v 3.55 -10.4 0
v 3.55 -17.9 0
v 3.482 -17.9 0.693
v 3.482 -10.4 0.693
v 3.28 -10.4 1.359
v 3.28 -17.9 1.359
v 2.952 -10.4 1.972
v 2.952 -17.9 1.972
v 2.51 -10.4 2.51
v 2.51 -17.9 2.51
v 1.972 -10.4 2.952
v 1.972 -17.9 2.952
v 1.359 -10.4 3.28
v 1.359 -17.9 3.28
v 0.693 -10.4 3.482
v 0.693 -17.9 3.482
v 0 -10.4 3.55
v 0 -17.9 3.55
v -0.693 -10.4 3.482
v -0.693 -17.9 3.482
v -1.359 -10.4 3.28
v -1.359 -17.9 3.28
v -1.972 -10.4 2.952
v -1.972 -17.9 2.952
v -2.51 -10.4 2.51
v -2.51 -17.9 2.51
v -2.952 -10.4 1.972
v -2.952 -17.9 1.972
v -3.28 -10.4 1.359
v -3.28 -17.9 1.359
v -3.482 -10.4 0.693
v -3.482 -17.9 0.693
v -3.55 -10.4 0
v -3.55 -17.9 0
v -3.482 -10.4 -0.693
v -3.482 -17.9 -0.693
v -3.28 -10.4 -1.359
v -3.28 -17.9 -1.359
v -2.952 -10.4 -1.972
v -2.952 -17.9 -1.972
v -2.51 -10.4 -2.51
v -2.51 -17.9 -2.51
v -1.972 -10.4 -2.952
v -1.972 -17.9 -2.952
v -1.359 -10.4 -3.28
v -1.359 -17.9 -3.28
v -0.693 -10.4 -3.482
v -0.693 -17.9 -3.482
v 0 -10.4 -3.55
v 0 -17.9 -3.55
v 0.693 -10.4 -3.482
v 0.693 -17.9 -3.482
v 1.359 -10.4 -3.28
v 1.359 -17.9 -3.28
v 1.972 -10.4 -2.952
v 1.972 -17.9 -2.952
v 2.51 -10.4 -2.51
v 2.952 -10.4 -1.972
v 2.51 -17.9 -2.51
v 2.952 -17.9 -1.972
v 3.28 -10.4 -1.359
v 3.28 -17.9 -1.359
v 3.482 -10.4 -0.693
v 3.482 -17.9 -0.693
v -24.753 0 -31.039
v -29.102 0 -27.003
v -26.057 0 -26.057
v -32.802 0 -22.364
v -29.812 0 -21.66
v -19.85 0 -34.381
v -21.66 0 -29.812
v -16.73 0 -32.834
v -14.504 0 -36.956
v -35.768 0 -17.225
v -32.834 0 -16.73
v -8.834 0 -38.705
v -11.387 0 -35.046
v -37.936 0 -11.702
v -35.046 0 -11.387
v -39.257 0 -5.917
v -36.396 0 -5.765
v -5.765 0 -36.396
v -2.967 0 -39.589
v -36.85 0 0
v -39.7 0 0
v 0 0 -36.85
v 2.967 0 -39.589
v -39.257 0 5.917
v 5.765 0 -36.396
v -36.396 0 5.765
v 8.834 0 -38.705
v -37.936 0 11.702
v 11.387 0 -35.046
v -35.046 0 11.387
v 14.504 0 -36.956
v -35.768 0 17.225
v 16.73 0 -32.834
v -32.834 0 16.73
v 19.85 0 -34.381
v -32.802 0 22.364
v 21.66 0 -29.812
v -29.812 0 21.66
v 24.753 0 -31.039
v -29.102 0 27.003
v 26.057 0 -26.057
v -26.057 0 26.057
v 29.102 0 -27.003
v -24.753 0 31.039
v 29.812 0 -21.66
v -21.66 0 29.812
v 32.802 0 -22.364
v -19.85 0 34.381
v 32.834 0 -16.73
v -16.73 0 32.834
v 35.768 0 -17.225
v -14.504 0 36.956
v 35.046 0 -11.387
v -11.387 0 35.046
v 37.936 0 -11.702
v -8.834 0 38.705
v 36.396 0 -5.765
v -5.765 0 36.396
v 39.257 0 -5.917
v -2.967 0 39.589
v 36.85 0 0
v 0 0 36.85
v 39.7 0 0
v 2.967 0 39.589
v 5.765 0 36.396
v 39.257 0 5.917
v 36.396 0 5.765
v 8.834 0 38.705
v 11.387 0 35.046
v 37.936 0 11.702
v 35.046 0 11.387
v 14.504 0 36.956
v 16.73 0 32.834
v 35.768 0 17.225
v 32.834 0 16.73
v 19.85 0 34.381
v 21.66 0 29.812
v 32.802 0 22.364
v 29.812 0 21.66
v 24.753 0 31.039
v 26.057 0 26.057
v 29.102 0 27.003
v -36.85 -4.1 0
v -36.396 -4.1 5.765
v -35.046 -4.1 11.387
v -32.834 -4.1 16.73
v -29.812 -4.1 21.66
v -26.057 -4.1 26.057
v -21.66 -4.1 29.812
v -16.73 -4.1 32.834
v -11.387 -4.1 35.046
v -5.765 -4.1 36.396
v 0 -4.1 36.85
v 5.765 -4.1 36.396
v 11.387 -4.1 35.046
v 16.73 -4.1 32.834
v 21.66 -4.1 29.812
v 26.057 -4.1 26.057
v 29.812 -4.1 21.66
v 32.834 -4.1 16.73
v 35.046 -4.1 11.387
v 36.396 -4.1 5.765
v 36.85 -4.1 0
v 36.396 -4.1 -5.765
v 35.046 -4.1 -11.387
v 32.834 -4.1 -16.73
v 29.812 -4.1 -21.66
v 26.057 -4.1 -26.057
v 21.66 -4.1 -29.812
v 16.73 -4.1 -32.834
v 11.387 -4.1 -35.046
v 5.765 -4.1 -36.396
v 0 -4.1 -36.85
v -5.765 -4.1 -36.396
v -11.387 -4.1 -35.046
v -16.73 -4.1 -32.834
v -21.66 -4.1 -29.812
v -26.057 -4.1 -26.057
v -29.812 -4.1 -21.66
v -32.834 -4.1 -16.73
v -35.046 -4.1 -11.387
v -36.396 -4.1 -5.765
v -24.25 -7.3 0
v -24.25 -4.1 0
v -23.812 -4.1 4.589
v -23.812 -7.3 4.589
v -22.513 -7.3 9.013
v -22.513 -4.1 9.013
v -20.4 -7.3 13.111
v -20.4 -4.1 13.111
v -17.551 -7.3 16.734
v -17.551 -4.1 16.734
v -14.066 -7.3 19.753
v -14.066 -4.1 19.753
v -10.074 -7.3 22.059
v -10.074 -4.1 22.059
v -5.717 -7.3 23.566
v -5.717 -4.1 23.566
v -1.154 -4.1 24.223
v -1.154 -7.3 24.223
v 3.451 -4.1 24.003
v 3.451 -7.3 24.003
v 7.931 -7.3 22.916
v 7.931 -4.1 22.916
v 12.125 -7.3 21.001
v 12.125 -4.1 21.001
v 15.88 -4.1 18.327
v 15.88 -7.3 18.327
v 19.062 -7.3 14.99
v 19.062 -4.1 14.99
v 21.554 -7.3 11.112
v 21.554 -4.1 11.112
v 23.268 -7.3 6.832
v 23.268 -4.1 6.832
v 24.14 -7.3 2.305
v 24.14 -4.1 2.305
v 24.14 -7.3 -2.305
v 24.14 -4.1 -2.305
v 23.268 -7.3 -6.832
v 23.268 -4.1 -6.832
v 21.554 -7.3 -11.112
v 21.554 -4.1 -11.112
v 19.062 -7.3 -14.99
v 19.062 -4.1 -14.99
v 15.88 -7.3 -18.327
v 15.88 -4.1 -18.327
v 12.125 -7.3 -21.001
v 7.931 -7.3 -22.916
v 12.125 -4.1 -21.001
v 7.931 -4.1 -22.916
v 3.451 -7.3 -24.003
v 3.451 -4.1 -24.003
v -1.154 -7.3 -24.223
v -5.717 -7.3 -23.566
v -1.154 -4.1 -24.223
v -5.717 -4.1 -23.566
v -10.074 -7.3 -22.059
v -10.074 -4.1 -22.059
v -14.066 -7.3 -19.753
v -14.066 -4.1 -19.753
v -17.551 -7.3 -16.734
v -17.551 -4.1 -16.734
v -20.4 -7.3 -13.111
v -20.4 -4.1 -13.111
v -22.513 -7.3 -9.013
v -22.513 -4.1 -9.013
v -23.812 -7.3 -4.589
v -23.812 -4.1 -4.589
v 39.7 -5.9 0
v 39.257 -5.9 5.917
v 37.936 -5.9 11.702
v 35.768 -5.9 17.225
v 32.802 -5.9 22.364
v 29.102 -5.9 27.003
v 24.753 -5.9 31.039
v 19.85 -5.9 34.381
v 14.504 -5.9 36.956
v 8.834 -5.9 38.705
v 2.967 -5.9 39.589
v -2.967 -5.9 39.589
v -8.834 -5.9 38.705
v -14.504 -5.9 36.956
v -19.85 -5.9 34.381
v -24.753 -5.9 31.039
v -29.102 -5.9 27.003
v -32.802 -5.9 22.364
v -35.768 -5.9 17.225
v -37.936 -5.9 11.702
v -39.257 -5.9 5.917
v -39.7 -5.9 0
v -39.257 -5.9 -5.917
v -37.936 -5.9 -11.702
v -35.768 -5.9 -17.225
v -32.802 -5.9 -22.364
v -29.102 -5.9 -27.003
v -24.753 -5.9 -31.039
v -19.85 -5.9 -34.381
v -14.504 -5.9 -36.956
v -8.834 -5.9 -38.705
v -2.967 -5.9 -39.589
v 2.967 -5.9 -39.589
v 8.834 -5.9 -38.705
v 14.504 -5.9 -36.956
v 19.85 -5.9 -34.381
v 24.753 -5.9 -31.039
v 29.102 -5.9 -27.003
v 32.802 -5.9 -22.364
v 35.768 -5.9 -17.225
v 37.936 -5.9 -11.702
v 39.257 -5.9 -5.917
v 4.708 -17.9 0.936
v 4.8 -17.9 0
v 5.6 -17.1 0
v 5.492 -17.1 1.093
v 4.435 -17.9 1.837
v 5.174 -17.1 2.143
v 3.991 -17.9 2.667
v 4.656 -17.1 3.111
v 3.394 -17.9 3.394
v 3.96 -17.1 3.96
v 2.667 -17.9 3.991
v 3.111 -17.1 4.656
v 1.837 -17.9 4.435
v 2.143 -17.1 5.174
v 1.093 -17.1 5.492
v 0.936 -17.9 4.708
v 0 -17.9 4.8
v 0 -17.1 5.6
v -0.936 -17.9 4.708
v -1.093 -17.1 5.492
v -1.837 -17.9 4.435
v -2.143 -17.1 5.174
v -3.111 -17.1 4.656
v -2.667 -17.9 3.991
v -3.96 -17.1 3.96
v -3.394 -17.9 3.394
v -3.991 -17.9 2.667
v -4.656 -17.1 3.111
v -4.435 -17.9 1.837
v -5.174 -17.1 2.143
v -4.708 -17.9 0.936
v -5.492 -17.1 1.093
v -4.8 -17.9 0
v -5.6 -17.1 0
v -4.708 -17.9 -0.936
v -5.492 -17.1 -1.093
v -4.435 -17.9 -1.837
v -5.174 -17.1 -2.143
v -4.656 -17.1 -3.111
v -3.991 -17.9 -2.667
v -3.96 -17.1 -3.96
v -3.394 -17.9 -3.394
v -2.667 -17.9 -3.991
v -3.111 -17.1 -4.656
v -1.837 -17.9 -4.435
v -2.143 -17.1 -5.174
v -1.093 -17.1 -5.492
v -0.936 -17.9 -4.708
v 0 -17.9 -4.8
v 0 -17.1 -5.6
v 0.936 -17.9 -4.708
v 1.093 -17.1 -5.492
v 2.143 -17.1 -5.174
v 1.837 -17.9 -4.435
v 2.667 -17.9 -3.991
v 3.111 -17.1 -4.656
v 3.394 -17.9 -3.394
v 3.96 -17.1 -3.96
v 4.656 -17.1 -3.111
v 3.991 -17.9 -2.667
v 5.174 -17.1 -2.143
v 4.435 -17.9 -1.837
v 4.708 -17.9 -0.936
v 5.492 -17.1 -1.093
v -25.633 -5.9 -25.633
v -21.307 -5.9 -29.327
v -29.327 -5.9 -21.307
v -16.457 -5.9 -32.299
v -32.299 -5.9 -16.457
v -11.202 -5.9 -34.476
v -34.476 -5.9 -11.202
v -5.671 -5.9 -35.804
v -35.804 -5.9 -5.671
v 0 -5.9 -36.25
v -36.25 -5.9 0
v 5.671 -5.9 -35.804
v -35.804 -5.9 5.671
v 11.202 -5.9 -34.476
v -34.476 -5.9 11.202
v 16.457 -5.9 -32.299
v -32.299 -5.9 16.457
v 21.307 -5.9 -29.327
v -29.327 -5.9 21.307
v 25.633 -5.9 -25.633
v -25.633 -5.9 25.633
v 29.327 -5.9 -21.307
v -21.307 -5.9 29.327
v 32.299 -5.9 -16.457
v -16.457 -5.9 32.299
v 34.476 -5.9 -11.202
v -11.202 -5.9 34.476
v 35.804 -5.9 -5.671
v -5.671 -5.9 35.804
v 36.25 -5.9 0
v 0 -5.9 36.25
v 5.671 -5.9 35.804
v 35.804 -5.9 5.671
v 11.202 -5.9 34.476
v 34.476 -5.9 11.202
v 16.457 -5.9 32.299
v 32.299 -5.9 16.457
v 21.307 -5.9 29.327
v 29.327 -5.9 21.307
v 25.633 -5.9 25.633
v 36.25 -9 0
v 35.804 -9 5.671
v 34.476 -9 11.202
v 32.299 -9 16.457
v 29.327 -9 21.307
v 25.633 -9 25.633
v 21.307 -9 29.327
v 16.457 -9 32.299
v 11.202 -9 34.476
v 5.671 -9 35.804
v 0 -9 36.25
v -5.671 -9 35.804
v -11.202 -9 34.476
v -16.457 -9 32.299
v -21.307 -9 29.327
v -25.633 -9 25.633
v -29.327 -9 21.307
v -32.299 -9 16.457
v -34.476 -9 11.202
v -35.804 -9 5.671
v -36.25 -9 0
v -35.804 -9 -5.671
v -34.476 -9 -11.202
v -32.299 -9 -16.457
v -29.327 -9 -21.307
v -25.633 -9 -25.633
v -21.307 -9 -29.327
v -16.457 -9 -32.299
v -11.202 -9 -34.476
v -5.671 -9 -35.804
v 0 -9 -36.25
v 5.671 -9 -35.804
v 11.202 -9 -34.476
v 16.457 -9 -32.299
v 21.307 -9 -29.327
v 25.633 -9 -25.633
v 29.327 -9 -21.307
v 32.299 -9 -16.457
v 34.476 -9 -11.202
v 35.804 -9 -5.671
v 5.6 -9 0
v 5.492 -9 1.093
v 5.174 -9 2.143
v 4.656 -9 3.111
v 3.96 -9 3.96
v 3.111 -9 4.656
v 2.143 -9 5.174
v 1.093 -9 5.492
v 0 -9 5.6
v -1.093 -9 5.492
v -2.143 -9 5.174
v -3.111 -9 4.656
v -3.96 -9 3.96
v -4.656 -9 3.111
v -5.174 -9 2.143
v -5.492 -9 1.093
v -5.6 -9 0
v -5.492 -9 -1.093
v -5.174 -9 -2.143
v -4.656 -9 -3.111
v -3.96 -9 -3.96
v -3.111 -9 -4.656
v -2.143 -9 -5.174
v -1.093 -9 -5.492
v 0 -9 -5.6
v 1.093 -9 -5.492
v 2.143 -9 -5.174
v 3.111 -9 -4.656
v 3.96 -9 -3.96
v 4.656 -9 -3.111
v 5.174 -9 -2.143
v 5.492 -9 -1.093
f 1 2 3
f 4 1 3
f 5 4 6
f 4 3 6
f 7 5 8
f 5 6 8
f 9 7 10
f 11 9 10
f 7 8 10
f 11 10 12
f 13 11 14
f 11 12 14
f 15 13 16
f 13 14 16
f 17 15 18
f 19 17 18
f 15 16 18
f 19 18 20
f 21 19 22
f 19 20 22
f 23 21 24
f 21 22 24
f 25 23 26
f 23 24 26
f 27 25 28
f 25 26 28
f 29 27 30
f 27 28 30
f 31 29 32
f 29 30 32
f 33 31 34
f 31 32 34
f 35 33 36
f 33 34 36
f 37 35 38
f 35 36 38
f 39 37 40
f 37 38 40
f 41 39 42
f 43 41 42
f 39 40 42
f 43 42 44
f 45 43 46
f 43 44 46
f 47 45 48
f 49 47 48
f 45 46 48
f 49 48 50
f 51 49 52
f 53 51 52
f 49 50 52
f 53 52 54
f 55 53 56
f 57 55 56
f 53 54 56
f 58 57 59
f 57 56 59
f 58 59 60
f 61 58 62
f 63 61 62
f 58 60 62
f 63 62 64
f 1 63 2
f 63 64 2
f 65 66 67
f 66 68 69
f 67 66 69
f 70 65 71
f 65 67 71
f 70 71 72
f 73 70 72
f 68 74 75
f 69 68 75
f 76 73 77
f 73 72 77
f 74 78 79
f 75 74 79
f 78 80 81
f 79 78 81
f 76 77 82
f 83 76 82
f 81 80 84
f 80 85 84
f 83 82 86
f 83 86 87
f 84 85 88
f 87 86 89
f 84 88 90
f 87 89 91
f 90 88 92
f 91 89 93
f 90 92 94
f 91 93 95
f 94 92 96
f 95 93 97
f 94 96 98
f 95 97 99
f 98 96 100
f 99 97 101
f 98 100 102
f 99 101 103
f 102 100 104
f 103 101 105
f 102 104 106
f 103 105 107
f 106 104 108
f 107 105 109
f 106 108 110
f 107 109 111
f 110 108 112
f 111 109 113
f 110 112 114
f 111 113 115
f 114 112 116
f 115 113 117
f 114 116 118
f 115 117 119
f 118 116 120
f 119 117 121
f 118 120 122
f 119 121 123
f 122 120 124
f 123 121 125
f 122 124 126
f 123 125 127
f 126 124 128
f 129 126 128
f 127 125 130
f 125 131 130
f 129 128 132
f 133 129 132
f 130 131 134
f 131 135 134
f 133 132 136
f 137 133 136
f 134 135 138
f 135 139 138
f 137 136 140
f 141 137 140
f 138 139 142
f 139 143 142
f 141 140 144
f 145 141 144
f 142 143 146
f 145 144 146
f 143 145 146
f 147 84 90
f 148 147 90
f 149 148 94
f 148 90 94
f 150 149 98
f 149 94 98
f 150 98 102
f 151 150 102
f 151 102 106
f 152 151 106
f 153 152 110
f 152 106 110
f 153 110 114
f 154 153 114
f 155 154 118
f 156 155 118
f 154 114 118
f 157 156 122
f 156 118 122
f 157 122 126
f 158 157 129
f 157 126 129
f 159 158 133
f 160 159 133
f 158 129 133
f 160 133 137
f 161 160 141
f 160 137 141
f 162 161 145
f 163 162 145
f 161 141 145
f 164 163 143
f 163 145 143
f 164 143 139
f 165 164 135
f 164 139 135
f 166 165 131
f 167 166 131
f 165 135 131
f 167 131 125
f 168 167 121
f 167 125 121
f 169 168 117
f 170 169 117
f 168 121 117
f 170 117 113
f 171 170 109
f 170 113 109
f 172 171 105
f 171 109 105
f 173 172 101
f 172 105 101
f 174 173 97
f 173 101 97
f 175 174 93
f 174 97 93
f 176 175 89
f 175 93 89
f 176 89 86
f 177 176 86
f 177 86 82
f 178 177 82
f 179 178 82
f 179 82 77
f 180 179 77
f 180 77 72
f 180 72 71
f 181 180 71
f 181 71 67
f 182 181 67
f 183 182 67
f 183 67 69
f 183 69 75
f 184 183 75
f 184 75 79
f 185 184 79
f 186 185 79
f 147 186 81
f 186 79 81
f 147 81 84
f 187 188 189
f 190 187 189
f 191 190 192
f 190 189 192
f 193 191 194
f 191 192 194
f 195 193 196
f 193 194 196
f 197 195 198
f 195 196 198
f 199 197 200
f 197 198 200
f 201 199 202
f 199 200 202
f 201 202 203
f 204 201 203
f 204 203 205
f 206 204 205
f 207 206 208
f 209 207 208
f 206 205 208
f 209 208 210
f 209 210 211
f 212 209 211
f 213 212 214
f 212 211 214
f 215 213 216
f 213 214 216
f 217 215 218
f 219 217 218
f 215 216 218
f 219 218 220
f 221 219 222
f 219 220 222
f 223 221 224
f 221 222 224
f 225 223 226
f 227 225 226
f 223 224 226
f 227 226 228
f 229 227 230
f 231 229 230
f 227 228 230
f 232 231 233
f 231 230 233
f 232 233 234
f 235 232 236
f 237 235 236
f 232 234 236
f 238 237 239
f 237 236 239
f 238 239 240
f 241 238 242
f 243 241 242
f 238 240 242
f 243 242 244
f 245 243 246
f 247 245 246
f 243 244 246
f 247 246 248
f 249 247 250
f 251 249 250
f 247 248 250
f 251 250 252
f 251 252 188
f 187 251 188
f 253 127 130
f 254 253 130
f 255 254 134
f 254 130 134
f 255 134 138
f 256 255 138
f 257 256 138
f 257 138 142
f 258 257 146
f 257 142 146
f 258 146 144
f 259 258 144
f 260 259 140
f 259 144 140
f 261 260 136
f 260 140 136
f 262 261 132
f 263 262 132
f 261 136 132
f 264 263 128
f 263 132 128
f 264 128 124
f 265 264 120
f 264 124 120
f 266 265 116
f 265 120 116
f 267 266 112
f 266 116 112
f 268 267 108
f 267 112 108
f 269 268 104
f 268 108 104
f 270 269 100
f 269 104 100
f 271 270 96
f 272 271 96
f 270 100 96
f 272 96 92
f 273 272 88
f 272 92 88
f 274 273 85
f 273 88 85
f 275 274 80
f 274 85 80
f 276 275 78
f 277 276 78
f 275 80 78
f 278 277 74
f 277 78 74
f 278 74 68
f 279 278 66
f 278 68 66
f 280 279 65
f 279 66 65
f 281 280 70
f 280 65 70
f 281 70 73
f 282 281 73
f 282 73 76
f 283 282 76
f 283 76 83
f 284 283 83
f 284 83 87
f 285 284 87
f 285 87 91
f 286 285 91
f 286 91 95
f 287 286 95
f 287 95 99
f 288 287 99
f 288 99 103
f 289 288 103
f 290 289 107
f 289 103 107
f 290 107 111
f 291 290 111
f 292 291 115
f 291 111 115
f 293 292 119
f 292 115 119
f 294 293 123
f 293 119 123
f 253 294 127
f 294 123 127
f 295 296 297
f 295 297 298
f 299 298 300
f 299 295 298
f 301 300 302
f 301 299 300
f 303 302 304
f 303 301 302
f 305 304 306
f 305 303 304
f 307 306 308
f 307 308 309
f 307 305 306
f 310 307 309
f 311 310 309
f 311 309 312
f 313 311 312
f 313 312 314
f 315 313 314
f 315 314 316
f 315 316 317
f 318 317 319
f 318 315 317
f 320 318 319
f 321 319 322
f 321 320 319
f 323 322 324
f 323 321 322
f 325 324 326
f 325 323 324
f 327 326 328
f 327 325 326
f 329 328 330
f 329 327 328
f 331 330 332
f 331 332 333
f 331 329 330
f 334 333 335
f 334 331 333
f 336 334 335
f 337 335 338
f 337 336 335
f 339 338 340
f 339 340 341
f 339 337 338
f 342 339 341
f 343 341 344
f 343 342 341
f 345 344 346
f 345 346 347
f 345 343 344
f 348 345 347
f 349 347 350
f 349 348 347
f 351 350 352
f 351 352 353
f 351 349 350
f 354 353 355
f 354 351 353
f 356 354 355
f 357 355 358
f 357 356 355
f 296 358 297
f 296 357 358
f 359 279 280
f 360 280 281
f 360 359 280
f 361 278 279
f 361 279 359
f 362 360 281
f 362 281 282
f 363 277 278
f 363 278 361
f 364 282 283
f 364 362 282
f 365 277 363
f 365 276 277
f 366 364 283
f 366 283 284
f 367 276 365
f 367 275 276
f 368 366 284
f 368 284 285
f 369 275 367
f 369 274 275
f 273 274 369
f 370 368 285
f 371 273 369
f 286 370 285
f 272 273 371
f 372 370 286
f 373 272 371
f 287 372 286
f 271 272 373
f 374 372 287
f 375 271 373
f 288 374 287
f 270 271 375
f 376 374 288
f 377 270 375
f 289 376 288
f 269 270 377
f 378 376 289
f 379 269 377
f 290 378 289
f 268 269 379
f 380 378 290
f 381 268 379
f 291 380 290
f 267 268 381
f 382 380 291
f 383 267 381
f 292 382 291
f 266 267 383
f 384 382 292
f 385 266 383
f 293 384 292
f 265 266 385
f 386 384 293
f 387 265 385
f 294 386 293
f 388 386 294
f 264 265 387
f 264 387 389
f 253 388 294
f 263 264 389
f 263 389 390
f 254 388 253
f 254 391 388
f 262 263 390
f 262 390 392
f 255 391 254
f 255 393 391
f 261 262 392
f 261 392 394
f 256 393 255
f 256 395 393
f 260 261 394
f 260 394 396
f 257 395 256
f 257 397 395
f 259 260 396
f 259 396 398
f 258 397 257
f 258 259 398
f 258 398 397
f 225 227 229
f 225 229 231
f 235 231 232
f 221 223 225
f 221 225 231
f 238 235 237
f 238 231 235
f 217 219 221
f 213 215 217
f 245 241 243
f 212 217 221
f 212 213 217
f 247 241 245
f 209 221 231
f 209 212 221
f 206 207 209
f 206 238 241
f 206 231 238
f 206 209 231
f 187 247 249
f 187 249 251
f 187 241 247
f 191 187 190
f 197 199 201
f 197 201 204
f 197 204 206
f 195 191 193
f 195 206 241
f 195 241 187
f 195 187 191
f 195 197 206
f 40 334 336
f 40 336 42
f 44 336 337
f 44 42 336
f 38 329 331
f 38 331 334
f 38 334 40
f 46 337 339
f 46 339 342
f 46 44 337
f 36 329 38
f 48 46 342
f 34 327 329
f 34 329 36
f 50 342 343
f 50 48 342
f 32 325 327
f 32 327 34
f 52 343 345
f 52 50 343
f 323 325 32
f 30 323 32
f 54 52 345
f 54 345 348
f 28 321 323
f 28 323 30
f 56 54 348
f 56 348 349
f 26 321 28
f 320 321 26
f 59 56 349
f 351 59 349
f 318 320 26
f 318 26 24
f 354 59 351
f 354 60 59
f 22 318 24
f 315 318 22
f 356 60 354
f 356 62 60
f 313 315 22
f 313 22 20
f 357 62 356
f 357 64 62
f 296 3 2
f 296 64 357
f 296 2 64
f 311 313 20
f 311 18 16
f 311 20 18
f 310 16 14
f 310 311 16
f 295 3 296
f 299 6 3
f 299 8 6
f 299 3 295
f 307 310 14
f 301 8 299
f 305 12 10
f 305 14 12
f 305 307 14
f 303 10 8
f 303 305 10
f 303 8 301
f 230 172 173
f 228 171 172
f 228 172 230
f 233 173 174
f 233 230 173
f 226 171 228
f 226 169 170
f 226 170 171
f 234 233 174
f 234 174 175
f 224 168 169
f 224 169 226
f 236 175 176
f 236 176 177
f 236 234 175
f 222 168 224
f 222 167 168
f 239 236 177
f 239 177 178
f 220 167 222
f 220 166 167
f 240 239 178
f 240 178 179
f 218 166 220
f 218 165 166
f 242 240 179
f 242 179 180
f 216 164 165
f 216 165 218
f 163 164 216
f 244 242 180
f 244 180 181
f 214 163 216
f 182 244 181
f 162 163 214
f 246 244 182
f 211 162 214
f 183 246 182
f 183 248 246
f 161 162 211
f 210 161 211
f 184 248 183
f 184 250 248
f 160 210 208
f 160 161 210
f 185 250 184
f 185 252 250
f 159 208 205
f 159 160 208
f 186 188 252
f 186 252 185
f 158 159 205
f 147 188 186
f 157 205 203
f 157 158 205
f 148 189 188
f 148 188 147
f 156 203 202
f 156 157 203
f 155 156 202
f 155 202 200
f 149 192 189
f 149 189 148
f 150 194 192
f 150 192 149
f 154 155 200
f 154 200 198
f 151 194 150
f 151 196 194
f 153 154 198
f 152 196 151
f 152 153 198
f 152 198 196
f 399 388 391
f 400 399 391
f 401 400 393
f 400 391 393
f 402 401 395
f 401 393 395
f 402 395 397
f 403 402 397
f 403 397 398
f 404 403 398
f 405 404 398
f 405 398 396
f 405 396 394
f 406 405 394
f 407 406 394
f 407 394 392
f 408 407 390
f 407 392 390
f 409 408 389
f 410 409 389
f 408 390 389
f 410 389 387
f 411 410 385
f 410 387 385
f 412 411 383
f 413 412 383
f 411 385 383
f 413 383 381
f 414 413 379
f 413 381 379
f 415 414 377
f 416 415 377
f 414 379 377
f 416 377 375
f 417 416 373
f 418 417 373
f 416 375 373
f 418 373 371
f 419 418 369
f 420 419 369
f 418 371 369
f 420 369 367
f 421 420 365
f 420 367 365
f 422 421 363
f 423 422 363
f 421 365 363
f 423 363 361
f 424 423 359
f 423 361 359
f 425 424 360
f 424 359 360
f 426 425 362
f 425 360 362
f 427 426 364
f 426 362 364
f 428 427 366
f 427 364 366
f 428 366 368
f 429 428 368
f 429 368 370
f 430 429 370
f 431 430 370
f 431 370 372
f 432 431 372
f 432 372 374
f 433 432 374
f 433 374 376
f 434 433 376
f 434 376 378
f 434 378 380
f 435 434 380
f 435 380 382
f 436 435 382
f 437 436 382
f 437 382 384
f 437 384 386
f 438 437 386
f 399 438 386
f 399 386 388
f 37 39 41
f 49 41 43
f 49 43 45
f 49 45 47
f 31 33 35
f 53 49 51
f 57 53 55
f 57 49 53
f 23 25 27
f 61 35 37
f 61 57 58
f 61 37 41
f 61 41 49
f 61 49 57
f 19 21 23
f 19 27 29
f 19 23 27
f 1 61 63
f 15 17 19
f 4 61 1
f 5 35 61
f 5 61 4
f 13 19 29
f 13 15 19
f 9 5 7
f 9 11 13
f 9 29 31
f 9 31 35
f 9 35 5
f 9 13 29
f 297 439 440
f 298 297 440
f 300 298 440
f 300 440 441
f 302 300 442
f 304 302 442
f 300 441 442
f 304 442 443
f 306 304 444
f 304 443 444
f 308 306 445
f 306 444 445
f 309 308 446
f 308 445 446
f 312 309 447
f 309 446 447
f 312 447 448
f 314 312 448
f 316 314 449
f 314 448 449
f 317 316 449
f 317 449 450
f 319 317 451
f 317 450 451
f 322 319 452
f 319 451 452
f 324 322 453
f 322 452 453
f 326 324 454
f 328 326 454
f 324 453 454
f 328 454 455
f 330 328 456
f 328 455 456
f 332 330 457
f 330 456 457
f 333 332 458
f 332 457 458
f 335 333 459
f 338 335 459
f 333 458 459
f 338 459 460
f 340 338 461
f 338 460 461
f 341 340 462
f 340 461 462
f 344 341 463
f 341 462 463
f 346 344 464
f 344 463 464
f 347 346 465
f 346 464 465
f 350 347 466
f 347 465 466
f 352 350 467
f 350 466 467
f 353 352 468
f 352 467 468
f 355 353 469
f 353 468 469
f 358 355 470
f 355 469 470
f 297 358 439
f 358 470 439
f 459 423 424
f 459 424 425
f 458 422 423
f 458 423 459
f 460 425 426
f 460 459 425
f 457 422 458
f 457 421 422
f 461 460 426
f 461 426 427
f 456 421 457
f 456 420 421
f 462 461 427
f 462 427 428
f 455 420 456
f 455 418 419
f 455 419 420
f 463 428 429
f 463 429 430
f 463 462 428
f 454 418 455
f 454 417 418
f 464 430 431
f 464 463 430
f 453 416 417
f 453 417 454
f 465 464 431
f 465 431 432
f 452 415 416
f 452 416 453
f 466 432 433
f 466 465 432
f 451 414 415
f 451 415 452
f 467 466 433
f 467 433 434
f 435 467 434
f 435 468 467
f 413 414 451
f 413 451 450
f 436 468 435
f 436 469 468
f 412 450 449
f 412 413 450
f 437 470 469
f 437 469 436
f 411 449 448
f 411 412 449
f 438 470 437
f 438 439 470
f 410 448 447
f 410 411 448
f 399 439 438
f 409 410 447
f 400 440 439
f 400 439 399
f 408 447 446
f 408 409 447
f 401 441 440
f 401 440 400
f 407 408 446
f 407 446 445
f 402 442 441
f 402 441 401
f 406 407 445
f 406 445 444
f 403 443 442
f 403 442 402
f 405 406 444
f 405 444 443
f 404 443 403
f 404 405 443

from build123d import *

# Parameters (mm, degrees)
F0_R      = 39.7
F1_DEPTH  = 5.9
F2_R      = 36.25
F3_DEPTH  = 3.1
F4_R      = 5.6
F5_DEPTH  = 8.9
F6_R      = 36.85
F7_DEPTH  = 4.1
F8_R      = 24.25
F9_DEPTH  = 3.2
F10_R     = 3.55
F11_DEPTH = 7.5
F12_SIZE  = 0.8


with BuildPart() as f1:
    # F0 (on Front) → F1 (new body)
    with BuildSketch(Plane.XZ):
        Circle(F0_R)
    extrude(amount=F1_DEPTH)

    # F2 (on face) → F3 (join)
    with BuildSketch(Plane.XZ.offset(5.9)):
        Circle(F2_R)
    extrude(amount=F3_DEPTH)

    # F4 (on face) → F5 (join)
    with BuildSketch(Plane.XZ.offset(9)):
        Circle(F4_R)
    extrude(amount=F5_DEPTH)

    # F6 (on face) → F7 (cut)
    with BuildSketch(Plane(origin=(0, 0, 0), x_dir=(-1, 0, 0), z_dir=(0, 1, 0))):
        Circle(F6_R)
    extrude(amount=-F7_DEPTH, mode=Mode.SUBTRACT)

    # F8 (on face) → F9 (cut)
    with BuildSketch(Plane(origin=(0, -4.1, 0), x_dir=(-1, 0, 0), z_dir=(0, 1, 0))):
        Circle(F8_R)
    extrude(amount=-F9_DEPTH, mode=Mode.SUBTRACT)

    # F10 (on face) → F11 (cut)
    with BuildSketch(Plane.XZ.offset(17.9)):
        Circle(F10_R)
    extrude(amount=-F11_DEPTH, mode=Mode.SUBTRACT)

    # F12
    f12_edges = [f1.edges().sort_by_distance(p)[0] for p in [
        (-5.6, -17.9, 0),
    ]]
    chamfer(f12_edges, length=F12_SIZE)


solid = f1.part
